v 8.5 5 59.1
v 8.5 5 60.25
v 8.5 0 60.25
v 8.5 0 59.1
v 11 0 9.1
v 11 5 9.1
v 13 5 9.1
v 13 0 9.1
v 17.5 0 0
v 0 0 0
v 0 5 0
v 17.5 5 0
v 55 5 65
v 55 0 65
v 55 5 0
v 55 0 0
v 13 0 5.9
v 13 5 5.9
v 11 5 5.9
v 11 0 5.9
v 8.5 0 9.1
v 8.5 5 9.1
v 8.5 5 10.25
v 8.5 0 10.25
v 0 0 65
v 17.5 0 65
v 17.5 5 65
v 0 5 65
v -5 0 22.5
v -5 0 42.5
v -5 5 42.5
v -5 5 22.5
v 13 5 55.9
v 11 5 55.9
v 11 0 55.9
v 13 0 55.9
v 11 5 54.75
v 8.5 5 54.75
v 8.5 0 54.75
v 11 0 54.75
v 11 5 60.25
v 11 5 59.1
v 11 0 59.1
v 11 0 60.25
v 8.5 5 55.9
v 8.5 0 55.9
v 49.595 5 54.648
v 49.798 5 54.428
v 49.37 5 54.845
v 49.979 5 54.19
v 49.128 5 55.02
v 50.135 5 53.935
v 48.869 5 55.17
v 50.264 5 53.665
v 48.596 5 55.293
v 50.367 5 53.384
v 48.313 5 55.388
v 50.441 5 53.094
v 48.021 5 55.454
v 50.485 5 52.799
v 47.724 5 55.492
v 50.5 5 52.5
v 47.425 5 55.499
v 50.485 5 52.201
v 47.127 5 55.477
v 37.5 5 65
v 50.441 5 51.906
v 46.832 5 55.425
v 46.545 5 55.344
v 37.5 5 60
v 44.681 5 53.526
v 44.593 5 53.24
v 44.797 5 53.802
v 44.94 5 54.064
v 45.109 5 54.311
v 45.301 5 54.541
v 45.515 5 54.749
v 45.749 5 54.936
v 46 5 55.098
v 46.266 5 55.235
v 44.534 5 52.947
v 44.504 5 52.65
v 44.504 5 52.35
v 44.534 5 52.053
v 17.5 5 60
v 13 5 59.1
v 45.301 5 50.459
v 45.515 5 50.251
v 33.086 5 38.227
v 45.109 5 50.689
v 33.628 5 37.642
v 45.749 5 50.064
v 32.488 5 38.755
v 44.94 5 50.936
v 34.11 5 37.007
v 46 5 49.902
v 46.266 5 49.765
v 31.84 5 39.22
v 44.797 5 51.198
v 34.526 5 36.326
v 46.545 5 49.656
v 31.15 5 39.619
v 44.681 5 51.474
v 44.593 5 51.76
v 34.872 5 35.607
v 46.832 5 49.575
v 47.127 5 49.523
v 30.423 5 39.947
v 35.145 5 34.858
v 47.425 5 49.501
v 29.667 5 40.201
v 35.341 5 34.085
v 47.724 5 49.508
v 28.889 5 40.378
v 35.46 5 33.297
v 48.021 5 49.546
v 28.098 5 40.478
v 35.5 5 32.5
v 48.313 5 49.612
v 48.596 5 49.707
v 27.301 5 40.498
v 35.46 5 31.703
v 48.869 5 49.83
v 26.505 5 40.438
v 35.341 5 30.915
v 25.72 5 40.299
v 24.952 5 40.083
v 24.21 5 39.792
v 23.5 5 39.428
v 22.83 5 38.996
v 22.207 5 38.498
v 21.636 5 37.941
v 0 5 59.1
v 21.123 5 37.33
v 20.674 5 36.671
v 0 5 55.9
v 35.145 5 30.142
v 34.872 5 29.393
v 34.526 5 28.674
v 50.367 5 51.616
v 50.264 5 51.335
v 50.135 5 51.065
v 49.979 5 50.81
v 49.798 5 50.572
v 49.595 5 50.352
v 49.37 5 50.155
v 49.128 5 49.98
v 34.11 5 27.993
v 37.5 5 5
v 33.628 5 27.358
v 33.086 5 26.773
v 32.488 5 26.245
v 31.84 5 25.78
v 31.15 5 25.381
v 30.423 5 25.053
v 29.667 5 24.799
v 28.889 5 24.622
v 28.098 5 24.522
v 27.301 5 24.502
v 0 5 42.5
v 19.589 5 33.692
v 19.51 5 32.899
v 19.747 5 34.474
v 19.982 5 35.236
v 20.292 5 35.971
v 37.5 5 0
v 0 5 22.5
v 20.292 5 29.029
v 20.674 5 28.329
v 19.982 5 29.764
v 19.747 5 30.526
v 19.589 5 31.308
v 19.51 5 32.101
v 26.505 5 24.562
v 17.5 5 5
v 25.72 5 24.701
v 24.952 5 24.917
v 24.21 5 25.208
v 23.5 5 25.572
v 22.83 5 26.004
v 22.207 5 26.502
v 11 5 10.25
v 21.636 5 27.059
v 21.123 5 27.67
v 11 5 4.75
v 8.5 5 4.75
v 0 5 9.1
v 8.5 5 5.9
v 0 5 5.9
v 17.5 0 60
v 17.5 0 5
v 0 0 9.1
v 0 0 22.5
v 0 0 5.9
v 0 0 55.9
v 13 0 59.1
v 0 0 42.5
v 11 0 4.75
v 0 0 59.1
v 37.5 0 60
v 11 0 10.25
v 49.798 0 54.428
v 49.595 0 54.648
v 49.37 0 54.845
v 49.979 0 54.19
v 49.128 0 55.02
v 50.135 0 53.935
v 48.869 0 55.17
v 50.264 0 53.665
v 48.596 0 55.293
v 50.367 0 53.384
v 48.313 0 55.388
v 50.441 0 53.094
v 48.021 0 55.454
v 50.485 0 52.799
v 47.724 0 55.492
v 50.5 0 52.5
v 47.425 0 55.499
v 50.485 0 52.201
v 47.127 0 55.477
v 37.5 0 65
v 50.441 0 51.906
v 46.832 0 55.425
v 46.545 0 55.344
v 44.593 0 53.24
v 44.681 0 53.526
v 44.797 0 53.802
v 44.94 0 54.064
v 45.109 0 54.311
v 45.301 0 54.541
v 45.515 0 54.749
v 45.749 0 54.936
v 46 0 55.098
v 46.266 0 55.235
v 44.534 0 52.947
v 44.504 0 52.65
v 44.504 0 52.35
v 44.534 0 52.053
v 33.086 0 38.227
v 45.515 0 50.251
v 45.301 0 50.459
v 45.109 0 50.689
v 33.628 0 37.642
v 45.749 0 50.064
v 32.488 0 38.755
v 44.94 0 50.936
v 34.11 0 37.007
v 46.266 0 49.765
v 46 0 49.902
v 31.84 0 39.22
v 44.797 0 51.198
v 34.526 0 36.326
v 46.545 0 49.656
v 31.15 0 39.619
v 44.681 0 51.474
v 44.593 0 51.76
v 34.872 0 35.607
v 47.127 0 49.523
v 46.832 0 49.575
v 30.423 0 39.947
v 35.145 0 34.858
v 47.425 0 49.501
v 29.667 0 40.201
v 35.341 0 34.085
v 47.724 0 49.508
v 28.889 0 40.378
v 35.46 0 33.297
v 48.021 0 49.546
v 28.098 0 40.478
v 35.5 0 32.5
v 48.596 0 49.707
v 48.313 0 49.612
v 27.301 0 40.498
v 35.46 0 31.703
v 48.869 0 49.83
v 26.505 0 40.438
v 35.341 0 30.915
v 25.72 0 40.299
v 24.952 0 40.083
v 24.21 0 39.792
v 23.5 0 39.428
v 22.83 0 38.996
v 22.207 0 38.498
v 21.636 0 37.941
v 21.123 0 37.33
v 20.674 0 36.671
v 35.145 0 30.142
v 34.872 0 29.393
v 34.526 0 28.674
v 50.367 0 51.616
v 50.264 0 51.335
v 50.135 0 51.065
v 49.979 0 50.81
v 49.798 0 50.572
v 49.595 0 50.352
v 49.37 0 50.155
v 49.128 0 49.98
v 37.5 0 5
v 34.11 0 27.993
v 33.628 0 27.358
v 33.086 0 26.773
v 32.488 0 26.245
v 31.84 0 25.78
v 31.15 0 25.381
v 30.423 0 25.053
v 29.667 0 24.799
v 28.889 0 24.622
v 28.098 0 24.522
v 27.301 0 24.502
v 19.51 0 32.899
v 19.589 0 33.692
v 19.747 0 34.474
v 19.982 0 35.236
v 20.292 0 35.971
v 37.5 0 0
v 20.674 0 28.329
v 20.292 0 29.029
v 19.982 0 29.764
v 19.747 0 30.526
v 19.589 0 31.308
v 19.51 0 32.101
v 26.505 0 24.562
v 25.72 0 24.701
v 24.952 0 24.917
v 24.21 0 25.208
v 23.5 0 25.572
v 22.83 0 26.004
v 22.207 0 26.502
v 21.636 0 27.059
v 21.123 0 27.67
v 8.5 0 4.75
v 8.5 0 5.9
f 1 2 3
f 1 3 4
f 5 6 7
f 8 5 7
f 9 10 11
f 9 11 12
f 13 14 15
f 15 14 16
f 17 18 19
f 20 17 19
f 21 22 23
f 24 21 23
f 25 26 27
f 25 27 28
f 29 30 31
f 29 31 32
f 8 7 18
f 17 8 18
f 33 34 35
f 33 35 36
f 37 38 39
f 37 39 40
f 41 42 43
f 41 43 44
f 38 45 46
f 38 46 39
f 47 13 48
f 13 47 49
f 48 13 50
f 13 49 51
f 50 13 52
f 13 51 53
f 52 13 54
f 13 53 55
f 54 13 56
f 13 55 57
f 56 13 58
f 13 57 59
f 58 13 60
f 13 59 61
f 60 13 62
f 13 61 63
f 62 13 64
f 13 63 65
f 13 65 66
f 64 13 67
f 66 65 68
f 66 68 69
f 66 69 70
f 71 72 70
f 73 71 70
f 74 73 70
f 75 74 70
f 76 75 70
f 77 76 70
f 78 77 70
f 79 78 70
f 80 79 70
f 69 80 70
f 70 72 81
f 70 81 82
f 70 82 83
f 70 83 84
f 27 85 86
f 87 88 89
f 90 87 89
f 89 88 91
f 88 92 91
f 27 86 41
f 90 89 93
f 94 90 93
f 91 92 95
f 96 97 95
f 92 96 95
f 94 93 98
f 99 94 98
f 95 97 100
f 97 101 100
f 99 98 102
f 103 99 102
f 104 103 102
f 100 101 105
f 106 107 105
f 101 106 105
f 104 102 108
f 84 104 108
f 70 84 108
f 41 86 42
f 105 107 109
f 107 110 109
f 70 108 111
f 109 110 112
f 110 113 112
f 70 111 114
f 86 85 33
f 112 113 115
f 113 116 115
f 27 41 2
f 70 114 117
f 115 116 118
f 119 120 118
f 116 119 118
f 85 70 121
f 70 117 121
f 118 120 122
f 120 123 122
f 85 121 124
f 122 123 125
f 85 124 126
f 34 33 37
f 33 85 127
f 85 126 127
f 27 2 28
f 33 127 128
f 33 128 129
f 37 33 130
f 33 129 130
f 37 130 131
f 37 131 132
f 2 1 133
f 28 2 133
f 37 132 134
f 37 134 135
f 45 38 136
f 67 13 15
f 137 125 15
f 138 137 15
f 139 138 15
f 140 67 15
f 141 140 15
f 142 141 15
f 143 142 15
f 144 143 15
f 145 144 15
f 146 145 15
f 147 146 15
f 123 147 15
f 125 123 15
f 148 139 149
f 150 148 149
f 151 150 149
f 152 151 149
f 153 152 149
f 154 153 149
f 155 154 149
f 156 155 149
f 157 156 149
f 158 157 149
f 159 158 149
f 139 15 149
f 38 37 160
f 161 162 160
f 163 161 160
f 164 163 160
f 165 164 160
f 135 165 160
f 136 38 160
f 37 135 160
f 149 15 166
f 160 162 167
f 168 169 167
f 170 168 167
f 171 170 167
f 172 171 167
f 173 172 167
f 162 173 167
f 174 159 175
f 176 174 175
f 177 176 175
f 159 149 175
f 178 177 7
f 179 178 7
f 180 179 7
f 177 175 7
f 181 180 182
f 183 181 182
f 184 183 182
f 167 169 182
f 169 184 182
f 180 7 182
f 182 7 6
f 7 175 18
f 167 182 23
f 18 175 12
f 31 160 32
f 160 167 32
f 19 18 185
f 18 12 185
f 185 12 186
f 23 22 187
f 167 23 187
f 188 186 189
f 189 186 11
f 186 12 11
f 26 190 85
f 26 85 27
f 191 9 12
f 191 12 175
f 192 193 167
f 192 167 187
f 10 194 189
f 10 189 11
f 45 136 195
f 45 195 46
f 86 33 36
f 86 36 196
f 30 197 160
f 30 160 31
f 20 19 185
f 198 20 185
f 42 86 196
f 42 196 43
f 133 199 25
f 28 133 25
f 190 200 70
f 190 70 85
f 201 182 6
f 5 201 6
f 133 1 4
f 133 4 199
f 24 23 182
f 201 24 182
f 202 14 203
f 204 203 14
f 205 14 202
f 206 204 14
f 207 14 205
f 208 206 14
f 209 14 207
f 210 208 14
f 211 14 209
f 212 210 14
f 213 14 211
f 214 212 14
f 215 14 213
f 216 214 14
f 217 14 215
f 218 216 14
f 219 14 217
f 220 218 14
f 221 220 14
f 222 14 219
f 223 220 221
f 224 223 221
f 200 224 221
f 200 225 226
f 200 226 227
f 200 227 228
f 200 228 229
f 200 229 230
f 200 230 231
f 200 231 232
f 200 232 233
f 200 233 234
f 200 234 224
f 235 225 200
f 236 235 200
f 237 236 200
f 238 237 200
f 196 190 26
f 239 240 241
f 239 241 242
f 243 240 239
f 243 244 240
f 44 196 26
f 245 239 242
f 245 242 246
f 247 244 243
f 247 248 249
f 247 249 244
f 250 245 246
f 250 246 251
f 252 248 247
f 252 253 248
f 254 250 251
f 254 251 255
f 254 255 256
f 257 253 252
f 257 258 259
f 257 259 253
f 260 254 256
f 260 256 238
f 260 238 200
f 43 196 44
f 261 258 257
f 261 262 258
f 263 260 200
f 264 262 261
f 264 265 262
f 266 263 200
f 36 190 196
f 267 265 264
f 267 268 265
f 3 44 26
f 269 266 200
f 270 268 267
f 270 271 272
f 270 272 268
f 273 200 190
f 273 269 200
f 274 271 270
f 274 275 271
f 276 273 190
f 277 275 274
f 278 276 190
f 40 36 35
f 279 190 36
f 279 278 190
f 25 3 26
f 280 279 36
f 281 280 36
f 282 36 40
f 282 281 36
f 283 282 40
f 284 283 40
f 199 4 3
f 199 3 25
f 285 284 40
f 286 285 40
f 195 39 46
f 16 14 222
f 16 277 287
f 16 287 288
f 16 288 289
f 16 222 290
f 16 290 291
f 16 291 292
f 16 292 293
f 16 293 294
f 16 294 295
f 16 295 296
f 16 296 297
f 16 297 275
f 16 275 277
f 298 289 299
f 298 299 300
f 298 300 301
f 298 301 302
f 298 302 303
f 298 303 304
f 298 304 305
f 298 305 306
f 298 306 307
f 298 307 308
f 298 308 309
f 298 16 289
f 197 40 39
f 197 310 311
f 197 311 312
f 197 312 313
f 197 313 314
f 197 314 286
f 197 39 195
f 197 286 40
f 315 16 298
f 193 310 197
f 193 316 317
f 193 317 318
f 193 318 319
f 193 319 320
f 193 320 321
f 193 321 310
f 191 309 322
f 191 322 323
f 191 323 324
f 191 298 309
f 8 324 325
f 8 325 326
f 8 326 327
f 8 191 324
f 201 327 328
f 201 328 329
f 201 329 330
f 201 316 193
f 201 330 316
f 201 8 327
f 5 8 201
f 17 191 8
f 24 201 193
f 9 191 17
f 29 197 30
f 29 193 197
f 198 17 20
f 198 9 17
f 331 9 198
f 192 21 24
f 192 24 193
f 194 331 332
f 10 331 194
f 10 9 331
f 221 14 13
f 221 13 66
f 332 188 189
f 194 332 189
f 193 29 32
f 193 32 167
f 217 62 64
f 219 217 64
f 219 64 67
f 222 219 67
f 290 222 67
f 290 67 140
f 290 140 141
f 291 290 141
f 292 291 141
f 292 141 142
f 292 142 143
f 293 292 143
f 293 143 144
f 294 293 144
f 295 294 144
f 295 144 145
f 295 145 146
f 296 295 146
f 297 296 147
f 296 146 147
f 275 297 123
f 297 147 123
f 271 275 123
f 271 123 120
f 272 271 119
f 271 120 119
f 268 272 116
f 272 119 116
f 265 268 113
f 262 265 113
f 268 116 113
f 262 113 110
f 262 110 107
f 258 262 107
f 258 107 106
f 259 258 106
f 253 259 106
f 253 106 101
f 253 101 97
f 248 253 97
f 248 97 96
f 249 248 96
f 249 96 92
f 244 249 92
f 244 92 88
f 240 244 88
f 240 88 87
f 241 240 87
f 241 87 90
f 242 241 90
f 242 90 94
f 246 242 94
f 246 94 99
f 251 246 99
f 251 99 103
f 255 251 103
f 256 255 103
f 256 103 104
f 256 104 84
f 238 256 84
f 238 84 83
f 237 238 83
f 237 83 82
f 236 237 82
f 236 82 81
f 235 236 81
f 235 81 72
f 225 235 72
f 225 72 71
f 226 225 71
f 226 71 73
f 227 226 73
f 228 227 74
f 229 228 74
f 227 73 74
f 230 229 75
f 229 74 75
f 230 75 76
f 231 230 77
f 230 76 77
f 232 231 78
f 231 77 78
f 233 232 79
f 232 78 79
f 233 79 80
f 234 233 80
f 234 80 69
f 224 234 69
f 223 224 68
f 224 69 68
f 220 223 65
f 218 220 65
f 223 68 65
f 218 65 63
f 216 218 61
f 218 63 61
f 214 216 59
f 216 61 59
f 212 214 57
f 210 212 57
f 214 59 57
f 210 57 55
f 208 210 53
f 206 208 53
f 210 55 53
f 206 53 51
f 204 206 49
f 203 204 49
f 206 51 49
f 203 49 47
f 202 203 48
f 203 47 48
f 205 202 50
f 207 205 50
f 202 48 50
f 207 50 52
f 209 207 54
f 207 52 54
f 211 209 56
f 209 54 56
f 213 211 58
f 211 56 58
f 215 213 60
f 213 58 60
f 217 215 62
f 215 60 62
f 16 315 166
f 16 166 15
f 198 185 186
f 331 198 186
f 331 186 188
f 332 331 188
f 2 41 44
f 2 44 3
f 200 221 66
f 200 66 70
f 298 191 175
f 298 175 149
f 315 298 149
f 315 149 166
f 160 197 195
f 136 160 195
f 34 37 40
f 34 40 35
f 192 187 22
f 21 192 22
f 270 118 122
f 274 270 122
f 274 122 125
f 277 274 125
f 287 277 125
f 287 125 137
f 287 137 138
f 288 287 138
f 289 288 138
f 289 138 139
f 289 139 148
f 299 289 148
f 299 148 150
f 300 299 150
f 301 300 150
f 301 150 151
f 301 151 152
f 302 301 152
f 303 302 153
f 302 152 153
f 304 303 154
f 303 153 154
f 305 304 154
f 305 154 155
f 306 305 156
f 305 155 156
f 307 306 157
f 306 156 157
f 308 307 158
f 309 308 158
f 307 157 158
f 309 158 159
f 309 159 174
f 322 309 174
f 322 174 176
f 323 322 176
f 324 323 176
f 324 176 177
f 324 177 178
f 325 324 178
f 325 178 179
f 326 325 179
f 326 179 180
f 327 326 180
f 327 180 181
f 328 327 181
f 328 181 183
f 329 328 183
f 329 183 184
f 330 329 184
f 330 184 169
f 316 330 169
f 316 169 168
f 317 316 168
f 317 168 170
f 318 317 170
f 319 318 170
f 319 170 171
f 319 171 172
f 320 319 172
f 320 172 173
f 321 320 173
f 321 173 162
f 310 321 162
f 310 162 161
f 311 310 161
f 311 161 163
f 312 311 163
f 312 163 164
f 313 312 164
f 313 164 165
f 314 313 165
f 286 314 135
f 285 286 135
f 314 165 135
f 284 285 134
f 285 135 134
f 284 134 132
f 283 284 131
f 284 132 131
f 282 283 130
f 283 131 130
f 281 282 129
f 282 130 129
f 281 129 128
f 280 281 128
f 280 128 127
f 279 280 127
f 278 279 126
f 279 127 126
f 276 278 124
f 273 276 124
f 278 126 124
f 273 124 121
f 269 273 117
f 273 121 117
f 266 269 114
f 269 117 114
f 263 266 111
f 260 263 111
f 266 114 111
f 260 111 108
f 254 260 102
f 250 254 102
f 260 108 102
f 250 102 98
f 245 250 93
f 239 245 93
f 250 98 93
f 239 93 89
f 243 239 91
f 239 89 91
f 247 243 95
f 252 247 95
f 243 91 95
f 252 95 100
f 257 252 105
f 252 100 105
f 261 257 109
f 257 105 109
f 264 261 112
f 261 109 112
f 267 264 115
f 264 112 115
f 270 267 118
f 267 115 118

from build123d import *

# Parameters (mm, degrees)
BOSS_EXTRU_1_DEPTH      = 5
ESQUISSE2_R             = 8
ENL_V_MAT_EXTRU_1_DEPTH = 10
ENL_V_MAT_EXTRU_2_DEPTH = 10
ESQUISSE4_R             = 3
ENL_V_MAT_EXTRU_3_DEPTH = 10


with BuildPart() as part:
    # Esquisse1 → Boss.-Extru.1 (new body)
    with BuildSketch(Plane(origin=(0, 0, 0), x_dir=(1, 0, 0), z_dir=(0, 1, 0))):
        Polygon((17.5, -5), (37.5, -5), (37.5, 0), (55, 0), (55, -60), (55, -65), (37.5, -65), (37.5, -60), (17.5, -60), (17.5, -65), (0, -65), (0, -60), (0, -42.5), (-5, -42.5), (-5, -22.5), (0, -22.5), (0, 0), (17.5, 0), align=None)
    extrude(amount=BOSS_EXTRU_1_DEPTH)

    # Esquisse2 → Enlèv. mat.-Extru.1 (cut)
    with BuildSketch(Plane(origin=(0, 5, 0), x_dir=(1, 0, 0), z_dir=(0, 1, 0))):
        with Locations((27.5, -32.5)):
            Circle(ESQUISSE2_R)
    extrude(amount=-ENL_V_MAT_EXTRU_1_DEPTH, mode=Mode.SUBTRACT)

    # Esquisse3 → Enlèv. mat.-Extru.2 (cut)
    with BuildSketch(Plane(origin=(0, 5, 0), x_dir=(1, 0, 0), z_dir=(0, 1, 0))):
        Polygon((13, -5.9), (11, -5.9), (11, -4.75), (8.5, -4.75), (8.5, -5.9), (0, -5.9), (0, -9.1), (8.5, -9.1), (8.5, -10.25), (11, -10.25), (11, -9.1), (13, -9.1), align=None)
    enl_v_mat_extru_2 = extrude(amount=-ENL_V_MAT_EXTRU_2_DEPTH, mode=Mode.SUBTRACT)

    # Symétrie1: Enlèv. mat.-Extru.2 across plane
    add(enl_v_mat_extru_2.mirror(Plane(origin=(0, 0, 32.5), x_dir=(1, 0, 0), z_dir=(0, 0, -1))), mode=Mode.SUBTRACT)

    # Esquisse4 → Enlèv. mat.-Extru.3 (cut)
    with BuildSketch(Plane(origin=(0, 5, 0), x_dir=(1, 0, 0), z_dir=(0, 1, 0))):
        with Locations((47.5, -52.5)):
            Circle(ESQUISSE4_R)
    extrude(amount=-ENL_V_MAT_EXTRU_3_DEPTH, mode=Mode.SUBTRACT)


solid = part.part
